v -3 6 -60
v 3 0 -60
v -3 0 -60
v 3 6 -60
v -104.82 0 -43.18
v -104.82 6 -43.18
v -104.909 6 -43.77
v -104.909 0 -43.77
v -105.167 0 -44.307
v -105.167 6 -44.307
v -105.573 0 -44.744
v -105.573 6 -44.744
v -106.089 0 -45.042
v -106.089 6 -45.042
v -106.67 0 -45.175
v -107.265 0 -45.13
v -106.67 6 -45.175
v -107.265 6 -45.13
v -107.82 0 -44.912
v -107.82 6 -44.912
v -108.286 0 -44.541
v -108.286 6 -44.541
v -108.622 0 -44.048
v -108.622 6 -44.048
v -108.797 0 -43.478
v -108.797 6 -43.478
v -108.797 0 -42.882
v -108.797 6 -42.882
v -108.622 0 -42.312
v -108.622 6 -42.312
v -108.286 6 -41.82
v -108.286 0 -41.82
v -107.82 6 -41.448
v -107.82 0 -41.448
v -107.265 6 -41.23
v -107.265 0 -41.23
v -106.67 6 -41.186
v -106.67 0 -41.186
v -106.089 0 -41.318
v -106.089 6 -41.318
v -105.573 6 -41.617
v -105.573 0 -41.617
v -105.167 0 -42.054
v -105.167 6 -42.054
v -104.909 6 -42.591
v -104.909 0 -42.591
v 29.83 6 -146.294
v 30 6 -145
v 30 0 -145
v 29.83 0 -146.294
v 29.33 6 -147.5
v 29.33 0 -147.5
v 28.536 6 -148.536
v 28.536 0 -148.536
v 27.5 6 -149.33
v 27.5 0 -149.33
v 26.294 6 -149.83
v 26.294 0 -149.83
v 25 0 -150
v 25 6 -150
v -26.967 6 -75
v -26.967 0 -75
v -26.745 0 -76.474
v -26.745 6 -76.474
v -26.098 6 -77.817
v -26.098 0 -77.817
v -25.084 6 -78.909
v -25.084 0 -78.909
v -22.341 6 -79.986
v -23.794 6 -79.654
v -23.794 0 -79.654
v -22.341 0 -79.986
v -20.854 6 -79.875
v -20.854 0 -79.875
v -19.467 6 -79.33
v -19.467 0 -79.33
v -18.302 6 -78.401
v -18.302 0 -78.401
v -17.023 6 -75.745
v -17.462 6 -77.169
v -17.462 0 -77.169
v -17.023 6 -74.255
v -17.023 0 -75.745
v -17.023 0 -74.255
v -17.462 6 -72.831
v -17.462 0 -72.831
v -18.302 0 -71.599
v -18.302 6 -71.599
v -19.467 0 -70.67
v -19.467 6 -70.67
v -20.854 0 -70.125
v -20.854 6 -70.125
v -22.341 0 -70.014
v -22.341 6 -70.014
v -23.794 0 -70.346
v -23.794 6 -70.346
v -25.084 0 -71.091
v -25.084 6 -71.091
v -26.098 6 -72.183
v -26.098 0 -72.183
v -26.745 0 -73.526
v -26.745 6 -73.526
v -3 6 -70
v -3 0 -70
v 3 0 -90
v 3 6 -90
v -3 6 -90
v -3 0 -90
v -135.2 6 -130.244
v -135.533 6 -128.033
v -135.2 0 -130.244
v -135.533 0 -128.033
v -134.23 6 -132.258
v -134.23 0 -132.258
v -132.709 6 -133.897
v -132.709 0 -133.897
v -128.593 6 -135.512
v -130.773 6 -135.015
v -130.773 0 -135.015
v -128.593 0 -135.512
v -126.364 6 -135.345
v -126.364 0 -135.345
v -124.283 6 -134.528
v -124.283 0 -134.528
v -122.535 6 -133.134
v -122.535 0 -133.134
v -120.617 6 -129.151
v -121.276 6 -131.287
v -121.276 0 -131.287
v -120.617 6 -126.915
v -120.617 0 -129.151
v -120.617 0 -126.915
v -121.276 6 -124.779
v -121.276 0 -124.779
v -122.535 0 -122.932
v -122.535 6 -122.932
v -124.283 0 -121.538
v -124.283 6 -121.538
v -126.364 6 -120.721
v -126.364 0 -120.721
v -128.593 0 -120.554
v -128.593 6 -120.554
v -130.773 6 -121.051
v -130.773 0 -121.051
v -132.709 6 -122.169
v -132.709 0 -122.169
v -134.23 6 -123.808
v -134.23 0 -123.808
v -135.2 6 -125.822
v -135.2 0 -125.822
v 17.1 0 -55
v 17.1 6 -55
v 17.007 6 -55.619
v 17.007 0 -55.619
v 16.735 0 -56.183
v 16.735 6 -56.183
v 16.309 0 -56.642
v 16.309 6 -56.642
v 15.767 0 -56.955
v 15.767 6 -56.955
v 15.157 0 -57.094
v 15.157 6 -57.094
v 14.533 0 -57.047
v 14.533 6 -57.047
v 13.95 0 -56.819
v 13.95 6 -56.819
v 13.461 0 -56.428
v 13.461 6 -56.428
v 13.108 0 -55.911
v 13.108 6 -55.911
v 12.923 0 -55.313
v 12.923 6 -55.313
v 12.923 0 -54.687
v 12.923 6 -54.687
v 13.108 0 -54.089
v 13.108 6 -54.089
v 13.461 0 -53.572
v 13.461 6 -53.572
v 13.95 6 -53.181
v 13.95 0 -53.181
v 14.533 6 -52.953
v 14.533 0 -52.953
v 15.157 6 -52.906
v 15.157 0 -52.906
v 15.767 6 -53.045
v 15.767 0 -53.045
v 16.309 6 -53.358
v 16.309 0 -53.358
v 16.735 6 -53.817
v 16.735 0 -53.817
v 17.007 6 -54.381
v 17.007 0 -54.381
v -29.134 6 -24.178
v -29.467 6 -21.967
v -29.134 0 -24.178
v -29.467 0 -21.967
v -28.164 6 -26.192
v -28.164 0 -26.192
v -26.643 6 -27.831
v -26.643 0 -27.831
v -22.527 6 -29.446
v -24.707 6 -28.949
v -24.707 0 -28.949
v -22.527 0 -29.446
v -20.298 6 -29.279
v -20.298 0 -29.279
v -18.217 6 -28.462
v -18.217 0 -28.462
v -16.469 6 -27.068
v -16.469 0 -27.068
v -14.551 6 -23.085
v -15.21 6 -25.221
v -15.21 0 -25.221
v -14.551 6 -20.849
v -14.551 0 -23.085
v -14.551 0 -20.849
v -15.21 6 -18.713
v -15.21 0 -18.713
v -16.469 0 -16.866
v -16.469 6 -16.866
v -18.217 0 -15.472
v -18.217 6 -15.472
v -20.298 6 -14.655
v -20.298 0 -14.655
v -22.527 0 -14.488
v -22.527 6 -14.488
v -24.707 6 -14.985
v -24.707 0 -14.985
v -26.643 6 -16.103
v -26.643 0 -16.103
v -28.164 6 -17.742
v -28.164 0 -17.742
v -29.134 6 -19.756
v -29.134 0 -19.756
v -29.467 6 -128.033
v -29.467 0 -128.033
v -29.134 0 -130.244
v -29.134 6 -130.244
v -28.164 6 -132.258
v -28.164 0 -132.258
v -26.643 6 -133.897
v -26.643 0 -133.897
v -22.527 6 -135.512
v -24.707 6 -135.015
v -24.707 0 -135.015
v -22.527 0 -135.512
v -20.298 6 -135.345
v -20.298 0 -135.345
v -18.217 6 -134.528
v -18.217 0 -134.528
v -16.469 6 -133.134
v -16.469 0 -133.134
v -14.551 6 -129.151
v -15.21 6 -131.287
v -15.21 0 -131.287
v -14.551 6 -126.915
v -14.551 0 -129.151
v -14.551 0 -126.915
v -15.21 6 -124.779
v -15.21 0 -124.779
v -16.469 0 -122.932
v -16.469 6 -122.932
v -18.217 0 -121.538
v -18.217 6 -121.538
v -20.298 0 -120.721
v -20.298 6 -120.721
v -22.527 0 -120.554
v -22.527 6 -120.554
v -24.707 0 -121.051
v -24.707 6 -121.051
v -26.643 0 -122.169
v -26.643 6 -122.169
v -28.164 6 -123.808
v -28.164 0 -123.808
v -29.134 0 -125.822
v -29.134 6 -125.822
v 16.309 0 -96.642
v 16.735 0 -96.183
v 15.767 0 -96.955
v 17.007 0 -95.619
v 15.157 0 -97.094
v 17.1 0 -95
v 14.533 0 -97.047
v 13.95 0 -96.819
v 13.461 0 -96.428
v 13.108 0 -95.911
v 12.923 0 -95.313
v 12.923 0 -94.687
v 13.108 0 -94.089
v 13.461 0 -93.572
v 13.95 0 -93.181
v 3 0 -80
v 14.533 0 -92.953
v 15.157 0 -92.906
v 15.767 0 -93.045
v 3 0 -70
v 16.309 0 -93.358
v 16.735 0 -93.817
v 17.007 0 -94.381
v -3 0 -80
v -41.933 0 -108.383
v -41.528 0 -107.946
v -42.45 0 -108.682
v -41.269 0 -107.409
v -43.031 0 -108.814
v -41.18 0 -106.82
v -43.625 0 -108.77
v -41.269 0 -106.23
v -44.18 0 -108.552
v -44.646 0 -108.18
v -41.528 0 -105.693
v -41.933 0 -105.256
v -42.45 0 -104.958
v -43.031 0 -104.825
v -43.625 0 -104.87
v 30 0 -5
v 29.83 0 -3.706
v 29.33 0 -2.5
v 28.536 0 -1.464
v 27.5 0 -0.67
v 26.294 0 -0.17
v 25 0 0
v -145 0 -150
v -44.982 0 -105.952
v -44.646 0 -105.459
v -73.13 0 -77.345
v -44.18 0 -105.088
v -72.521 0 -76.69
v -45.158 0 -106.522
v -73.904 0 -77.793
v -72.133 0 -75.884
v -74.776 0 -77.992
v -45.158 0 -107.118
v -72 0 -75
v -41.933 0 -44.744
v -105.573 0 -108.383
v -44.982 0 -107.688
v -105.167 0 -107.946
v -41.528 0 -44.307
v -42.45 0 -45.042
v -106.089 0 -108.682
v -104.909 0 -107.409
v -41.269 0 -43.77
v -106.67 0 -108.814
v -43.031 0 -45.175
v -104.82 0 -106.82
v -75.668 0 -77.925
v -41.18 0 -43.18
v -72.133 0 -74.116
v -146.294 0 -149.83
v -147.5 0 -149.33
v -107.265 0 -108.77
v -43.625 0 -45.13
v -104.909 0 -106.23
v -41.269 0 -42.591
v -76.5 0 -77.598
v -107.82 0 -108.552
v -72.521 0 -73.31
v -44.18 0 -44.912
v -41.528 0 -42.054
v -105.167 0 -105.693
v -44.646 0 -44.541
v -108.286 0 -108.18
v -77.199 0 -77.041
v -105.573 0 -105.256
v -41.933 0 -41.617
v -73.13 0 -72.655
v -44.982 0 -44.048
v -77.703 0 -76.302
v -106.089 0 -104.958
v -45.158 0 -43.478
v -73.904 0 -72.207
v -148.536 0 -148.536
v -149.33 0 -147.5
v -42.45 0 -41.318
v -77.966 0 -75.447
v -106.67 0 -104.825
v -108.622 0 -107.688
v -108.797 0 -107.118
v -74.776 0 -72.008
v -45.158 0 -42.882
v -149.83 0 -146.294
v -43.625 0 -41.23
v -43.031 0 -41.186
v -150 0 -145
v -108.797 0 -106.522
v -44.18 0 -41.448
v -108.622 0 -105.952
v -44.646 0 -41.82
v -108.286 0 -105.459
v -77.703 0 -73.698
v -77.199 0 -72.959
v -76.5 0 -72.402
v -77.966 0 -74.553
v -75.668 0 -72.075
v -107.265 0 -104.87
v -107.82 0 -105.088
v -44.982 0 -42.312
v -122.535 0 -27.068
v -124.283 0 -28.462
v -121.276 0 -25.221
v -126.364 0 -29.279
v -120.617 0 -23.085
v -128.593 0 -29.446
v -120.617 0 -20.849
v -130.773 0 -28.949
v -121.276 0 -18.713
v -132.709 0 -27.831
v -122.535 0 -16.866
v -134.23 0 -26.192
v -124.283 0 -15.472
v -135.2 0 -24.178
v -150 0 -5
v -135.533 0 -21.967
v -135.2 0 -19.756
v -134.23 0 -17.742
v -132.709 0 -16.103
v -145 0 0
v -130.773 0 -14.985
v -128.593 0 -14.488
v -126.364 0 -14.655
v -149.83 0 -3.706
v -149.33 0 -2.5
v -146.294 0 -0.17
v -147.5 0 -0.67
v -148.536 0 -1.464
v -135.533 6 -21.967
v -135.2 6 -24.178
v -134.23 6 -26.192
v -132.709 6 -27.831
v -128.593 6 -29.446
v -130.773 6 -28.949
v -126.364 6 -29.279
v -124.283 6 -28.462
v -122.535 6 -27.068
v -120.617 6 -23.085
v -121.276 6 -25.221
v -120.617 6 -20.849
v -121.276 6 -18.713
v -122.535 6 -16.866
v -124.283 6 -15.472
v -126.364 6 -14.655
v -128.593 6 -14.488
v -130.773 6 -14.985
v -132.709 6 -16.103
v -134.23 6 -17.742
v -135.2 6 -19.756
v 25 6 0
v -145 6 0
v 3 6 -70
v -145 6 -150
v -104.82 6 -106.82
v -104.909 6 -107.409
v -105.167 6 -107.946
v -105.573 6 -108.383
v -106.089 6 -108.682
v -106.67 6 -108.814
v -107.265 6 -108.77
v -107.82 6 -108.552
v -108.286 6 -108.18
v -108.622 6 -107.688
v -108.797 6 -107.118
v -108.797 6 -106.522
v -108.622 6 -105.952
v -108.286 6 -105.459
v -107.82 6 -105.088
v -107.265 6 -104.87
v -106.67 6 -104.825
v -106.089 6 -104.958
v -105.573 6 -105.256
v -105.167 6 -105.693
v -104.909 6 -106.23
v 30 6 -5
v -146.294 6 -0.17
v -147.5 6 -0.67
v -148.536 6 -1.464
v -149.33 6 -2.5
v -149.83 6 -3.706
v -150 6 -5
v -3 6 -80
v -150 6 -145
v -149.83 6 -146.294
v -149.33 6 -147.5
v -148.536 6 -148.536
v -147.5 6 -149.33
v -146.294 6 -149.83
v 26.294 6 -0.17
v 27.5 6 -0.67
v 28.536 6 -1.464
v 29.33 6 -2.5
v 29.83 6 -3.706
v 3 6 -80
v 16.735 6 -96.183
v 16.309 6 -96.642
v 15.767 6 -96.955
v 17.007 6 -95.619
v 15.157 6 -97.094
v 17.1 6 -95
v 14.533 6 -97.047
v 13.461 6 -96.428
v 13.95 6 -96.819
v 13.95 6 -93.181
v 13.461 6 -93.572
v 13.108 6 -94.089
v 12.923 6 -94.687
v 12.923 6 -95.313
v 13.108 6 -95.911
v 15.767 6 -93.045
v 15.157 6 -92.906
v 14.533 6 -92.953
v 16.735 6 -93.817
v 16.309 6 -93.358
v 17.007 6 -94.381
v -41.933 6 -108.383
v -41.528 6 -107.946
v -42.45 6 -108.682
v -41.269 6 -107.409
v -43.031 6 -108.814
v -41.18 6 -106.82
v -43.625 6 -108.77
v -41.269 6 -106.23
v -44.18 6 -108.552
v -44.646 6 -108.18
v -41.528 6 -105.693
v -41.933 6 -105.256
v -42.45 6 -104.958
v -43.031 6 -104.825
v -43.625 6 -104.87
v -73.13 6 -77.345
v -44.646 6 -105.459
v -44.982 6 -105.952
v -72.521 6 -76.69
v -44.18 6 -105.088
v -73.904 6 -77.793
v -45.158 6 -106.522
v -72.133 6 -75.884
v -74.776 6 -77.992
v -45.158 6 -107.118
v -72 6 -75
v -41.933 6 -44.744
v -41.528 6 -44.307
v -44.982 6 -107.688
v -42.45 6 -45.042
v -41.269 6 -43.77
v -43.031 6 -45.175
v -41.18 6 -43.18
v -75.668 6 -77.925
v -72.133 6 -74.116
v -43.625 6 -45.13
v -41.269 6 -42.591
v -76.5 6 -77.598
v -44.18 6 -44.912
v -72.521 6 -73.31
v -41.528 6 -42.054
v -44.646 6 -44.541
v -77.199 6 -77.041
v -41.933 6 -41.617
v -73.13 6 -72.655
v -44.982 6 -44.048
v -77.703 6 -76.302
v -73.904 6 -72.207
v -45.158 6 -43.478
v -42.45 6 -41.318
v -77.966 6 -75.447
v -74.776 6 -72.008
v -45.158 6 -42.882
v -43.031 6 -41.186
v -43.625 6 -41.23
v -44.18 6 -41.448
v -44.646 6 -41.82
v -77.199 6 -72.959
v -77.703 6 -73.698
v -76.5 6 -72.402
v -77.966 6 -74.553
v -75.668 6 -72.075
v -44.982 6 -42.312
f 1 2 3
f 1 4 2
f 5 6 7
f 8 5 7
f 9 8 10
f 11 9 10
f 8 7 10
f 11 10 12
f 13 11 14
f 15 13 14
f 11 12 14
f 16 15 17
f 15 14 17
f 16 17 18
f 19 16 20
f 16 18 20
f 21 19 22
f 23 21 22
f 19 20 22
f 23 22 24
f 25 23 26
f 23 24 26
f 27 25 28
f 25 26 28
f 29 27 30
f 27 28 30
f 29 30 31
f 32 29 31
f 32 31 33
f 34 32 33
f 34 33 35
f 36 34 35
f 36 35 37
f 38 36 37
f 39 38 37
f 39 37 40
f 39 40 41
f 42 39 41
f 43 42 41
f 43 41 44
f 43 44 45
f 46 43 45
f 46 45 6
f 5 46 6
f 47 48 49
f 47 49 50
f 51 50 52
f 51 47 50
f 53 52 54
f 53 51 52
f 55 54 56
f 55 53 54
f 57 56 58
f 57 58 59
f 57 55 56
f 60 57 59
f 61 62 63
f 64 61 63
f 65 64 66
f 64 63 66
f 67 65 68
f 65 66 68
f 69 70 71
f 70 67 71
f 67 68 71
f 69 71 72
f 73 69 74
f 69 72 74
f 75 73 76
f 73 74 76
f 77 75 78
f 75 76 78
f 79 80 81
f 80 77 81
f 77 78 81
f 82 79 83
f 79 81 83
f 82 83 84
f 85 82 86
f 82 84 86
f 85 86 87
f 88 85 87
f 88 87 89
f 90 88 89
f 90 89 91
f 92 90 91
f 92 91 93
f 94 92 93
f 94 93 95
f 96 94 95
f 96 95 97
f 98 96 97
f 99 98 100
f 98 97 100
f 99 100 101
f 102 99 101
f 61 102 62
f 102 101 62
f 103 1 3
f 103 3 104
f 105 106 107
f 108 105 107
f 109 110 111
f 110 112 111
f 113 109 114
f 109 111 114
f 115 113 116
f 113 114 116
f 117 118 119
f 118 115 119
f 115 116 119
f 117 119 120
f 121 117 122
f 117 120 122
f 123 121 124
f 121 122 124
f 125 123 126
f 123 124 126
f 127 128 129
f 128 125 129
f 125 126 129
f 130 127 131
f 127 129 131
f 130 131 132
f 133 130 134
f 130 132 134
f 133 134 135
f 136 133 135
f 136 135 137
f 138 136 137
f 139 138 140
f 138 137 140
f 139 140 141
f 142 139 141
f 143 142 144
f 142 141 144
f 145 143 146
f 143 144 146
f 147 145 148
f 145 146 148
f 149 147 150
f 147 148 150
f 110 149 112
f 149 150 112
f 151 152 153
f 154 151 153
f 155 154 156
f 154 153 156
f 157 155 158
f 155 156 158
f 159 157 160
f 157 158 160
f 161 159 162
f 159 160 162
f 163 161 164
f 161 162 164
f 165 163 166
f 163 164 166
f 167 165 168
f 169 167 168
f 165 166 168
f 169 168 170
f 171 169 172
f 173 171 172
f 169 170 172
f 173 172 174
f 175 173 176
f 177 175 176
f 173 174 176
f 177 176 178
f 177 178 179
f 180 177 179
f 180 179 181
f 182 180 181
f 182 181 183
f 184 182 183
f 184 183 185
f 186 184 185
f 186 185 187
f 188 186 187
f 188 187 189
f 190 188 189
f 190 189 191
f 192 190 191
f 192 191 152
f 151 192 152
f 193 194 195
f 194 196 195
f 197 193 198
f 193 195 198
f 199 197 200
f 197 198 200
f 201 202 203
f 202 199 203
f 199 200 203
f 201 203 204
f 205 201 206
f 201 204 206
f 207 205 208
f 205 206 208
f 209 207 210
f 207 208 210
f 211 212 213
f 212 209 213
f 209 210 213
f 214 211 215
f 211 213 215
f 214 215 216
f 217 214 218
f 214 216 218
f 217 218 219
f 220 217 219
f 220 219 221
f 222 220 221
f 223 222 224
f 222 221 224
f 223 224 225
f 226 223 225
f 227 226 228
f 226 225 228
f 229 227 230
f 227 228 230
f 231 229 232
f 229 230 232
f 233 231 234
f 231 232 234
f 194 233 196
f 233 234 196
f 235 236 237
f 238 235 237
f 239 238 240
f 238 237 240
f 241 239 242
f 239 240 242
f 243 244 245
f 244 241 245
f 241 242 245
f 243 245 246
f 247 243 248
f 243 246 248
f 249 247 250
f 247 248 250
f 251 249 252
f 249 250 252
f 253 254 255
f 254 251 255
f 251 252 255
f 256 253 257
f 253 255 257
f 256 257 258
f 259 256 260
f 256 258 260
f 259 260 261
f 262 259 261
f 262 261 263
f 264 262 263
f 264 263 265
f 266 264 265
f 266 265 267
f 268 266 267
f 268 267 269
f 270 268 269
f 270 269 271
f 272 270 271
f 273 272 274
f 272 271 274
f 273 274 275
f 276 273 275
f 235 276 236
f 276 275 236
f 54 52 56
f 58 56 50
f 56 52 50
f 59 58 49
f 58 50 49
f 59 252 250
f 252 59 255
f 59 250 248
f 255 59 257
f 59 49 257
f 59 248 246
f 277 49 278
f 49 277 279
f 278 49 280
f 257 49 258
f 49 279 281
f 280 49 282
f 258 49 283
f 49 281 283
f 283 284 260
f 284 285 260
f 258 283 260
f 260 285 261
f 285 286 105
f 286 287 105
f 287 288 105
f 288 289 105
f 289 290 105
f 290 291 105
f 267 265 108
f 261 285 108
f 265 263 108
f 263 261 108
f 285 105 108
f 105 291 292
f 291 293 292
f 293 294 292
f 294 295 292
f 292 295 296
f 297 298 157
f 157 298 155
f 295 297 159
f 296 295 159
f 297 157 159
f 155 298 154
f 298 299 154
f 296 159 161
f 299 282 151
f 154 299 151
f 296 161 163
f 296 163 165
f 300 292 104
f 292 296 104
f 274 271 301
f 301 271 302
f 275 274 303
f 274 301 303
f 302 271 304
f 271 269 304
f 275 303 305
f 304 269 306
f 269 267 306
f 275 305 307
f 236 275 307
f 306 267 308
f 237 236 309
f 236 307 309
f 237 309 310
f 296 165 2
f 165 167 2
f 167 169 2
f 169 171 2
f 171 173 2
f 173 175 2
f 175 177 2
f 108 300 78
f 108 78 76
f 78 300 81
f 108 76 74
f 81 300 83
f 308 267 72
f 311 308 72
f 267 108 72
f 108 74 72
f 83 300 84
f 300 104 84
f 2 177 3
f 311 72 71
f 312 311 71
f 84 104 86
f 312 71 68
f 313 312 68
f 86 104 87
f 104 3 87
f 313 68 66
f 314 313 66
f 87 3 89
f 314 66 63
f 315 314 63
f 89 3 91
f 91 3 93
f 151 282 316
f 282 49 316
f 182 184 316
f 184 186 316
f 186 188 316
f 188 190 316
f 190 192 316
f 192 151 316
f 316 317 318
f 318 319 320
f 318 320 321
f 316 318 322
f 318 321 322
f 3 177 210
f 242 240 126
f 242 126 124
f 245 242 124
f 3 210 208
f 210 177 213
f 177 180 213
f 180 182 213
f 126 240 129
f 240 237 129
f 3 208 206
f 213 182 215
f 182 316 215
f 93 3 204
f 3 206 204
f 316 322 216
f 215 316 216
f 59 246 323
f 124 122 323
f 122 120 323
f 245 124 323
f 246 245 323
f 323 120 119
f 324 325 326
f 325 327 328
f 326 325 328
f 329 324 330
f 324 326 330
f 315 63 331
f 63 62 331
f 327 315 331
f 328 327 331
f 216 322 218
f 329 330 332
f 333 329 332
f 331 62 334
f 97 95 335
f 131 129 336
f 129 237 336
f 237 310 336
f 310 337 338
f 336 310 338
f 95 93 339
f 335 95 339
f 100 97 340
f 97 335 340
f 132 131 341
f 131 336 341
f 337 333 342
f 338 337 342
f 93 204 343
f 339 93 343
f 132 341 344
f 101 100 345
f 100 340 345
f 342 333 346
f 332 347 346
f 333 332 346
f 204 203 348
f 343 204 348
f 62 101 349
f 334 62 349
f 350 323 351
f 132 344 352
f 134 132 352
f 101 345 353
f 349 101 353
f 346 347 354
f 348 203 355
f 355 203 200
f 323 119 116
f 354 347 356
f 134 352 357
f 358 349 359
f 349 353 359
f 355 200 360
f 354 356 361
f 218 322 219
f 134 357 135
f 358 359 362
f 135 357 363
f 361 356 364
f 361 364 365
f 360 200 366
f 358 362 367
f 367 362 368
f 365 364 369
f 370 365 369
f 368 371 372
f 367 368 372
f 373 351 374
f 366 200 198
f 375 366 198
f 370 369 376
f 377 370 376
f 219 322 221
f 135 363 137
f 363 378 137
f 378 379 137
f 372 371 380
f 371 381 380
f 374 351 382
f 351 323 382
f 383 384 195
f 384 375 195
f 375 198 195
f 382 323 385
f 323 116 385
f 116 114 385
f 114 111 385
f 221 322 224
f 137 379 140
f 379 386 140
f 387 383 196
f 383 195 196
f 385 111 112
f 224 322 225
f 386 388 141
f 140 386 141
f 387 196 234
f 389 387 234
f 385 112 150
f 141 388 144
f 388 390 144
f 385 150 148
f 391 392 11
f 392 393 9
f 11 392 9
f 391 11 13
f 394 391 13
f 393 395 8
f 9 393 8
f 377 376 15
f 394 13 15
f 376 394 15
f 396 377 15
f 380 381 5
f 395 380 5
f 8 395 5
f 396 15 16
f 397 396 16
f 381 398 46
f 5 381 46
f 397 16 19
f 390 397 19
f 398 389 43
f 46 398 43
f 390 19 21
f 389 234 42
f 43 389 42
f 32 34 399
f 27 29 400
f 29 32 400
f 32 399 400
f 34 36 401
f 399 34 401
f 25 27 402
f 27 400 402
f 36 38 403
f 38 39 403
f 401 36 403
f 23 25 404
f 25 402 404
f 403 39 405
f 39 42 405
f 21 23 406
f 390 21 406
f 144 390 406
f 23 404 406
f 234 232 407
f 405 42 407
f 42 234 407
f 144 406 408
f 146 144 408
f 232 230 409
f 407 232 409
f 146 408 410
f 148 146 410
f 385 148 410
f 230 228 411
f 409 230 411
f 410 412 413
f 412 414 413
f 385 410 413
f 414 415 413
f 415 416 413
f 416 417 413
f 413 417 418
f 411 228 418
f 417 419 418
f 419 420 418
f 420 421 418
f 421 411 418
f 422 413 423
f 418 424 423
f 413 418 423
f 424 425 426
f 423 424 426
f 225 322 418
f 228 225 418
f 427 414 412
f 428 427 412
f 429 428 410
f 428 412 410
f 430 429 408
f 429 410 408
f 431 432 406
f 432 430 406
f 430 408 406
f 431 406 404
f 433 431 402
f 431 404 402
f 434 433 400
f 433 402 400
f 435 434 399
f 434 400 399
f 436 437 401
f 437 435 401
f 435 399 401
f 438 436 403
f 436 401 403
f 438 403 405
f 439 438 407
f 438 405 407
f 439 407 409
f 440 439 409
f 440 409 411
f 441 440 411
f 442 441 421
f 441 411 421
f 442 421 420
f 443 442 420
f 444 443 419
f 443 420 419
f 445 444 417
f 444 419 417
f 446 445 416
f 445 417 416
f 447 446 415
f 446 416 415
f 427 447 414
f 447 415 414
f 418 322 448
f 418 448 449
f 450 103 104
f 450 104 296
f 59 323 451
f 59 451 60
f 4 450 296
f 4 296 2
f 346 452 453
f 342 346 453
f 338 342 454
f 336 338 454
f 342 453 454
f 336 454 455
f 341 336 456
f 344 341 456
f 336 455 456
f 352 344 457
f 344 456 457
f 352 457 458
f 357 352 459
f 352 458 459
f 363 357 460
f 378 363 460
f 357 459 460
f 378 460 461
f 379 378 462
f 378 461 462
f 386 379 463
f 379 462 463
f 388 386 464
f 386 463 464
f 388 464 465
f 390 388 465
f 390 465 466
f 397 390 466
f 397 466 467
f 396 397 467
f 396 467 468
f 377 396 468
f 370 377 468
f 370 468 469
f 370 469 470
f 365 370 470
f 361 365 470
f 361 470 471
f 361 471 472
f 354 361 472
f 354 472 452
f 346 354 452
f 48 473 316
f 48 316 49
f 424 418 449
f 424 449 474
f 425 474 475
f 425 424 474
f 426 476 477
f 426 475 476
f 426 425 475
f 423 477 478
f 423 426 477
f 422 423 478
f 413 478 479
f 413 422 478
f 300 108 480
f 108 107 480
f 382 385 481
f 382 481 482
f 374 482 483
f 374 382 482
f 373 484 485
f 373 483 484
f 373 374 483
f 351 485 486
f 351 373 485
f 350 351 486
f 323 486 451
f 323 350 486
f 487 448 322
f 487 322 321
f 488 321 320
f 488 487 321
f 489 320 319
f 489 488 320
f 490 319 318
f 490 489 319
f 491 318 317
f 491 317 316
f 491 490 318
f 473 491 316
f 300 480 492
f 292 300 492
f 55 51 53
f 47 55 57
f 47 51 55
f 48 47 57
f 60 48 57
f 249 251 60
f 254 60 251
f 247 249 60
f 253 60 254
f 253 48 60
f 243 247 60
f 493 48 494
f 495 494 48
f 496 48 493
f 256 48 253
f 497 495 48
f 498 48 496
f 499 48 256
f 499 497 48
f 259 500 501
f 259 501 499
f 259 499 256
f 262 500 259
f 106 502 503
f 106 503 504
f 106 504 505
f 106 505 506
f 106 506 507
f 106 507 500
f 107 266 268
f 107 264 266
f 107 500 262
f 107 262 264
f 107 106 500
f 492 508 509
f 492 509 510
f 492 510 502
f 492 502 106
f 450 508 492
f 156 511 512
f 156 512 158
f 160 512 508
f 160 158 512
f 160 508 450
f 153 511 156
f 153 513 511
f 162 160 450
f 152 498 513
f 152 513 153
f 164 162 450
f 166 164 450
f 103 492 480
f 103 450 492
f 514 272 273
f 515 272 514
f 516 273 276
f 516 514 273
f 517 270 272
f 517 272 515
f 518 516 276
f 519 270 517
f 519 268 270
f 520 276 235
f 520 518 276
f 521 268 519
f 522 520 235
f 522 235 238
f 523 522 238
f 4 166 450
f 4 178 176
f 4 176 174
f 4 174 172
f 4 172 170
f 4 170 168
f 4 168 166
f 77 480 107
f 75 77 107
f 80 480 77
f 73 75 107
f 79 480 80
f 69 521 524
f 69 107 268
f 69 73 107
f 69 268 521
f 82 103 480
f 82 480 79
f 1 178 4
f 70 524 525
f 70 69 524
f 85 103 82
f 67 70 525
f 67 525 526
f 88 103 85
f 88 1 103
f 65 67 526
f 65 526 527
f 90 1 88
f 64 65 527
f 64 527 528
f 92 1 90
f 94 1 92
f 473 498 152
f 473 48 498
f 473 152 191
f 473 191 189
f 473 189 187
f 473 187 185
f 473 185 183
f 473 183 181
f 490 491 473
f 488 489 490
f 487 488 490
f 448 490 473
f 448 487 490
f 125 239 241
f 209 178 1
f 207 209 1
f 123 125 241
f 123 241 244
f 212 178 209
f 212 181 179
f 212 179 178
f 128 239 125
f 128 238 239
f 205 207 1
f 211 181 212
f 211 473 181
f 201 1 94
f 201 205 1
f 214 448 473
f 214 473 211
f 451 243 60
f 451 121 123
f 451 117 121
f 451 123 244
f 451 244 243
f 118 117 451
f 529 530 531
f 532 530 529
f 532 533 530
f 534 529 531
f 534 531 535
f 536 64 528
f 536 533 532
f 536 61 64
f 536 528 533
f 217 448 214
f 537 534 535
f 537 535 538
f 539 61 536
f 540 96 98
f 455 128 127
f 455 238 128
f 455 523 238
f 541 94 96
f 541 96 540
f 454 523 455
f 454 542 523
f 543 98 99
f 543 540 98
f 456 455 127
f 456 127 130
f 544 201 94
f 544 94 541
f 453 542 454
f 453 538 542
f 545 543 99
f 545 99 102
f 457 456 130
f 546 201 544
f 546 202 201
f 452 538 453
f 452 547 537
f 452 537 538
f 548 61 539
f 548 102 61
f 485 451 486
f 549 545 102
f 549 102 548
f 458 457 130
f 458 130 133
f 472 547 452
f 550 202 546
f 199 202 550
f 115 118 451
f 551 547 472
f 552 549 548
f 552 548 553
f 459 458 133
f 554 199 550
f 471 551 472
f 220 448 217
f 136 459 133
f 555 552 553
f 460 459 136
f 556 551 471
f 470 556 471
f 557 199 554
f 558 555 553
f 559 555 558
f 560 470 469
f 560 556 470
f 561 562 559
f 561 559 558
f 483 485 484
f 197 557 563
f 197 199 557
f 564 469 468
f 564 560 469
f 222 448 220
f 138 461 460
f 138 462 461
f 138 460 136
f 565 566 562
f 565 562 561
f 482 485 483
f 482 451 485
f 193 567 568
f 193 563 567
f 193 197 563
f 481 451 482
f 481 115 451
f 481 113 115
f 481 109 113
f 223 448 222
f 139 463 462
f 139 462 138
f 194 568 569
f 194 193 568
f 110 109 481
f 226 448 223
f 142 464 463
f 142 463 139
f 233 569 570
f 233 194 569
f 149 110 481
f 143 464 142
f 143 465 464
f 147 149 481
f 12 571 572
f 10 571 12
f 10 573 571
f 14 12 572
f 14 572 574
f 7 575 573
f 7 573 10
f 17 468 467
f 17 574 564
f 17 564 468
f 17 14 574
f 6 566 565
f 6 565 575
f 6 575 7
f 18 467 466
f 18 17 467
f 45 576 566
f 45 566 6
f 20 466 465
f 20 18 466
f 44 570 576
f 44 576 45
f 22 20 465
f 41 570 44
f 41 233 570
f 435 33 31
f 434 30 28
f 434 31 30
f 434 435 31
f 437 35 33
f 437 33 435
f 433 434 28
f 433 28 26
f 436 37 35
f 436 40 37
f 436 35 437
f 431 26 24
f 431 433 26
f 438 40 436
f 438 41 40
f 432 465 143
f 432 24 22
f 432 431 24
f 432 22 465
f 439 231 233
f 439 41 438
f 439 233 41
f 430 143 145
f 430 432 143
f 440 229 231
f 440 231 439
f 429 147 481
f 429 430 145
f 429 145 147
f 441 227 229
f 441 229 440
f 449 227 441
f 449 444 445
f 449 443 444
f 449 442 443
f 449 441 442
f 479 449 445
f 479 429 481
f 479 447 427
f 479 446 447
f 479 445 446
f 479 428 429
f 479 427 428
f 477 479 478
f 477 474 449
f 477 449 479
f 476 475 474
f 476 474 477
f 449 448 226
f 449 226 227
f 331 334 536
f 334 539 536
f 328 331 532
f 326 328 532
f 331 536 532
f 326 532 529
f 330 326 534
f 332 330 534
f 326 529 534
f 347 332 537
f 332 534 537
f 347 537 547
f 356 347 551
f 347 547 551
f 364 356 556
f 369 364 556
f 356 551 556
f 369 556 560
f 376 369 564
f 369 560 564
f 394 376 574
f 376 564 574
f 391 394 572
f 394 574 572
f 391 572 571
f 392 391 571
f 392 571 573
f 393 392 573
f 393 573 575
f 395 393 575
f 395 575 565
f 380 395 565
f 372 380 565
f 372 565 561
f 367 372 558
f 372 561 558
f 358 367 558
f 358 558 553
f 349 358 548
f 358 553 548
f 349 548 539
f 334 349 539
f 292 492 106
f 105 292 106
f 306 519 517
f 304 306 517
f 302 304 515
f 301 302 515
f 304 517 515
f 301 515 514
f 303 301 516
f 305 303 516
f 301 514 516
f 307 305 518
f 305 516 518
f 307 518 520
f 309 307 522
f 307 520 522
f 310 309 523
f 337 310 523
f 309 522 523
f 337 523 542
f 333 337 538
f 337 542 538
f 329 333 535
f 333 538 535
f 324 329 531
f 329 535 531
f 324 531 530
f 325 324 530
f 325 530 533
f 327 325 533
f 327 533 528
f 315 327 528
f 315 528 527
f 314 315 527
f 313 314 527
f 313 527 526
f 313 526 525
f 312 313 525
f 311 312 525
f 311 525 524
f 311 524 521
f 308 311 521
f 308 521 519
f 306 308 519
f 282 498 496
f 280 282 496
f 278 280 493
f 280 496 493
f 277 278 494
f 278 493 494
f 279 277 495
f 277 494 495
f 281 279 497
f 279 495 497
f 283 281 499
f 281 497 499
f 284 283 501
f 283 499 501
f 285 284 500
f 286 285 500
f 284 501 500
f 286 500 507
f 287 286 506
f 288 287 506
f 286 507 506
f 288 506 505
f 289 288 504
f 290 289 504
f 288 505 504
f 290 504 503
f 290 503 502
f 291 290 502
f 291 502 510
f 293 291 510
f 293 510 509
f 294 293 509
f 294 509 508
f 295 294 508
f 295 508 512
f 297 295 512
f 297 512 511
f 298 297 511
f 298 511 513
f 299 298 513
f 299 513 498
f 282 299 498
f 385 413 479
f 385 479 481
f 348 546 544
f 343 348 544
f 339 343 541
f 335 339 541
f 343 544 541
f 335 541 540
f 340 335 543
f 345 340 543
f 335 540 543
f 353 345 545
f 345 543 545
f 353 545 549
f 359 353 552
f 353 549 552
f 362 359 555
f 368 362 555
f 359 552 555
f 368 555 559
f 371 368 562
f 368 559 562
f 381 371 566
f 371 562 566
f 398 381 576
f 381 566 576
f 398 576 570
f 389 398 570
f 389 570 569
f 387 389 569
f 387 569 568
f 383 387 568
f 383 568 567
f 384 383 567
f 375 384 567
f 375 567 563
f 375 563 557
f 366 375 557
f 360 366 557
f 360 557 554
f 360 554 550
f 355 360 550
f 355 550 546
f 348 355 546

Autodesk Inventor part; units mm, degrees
ref_plane "YZ Plane" through (0, 0, 0) normal (1, 0, 0) x (0, 1, 0)
ref_plane "XZ Plane" through (0, 0, 0) normal (0, 1, 0) x (-1, 0, 0)
ref_plane "XY Plane" through (0, 0, 0) normal (0, 0, 1) x (1, 0, 0)
sketch "Sketch1" plane through (0, 0, 0) normal (0, 1, 0) x (-1, 0, 0)
  line L0 (5, 0) -> (145, 0)
  line L1 (150, -5) -> (150, -145)
  line L2 (145, -150) -> (5, -150)
  line L3 (0, -145) -> (0, -5)
  arc A0 (150, -5) -> (145, 0) centre (145, -5) ccw
  arc A1 (150, -5) -> (145, 0) centre (145, -5) ccw
  arc A2 (145, -150) -> (150, -145) centre (145, -145) ccw
  arc A3 (5, 0) -> (0, -5) centre (5, -5) ccw
  arc A4 (0, -145) -> (5, -150) centre (5, -145) ccw
  circle A5 centre (128.033, -21.967) radius 7.5
  circle A6 centre (128.033, -128.033) radius 7.5
  circle A7 centre (21.967, -128.033) radius 7.5
  circle A8 centre (21.967, -21.967) radius 7.5
  circle A9 centre (21.967, -75) radius 5
  point P0 (150, -150)
  point P1 (150, 0)
  point P2 (0, -150)
  dimension "d12" = 150
  dimension "d13" = 150
  dimension "d22" = 5
  dimension "d23" = 5
  dimension "d28" = 15
  dimension "d29" = 15
  dimension "d30" = 15
  dimension "d31" = 15
  dimension "d32" = 10
extrude "Extrusion1" add sketch "Sketch1" along normal blind 6
sketch "Sketch2" plane through (0, 6, 0) normal (0, 1, 0) x (1, 0, 0)
  arc A0 (-5, 0) -> (0, 5) centre (-5, 5) ccw projected
  arc A1 (-145, 150) -> (-150, 145) centre (-145, 145) ccw projected
  arc A2 (-150, 5) -> (-145, 0) centre (-145, 5) ccw projected
  circle A3 centre (-21.967, 128.033) radius 7.5 projected
  circle A4 centre (-128.033, 21.967) radius 7.5 projected
  circle A5 centre (-128.033, 128.033) radius 7.5 projected
  circle A6 centre (-106.8198, 43.1802) radius 2
  circle A7 centre (-106.8198, 106.8198) radius 2
  circle A8 centre (-43.1802, 43.1802) radius 2
  circle A9 centre (-43.1802, 106.8198) radius 2
  circle A10 centre (-75, 75) radius 3
  point P0 (0, 0)
  dimension "d39" = 4
  dimension "d40" = 4
  dimension "d41" = 4
  dimension "d42" = 4
  dimension "d43" = 6
  dimension "d47" = 30
extrude "Extrusion2" cut sketch "Sketch2" against normal blind 6 contours A6 | A7 | A8 | A9 | A10
sketch "Sketch3" plane through (0, 6, 0) normal (0, 1, 0) x (1, 0, 0)
  arc A0 (-5, 0) -> (0, 5) centre (-5, 5) ccw projected
  line L0 (-5, 0) -> (25, 0)
  line L1 (30, 5) -> (30, 145)
  line L2 (25, 150) -> (-5, 150)
  line L3 (-5, 150) -> (-5, 0)
  arc A1 (25, 0) -> (30, 5) centre (25, 5) ccw
  arc A2 (30, 145) -> (25, 150) centre (25, 145) ccw
  point P0 (0, 0)
  point P1 (30, 150)
  point P2 (30, 0)
  dimension "d48" = 35
  dimension "d49" = 150
  dimension "d50" = 5
extrude "Extrusion3" add sketch "Sketch3" against normal blind 6
sketch "Sketch4" plane through (0, 6, 0) normal (0, 1, 0) x (1, 0, 0)
  line L0 (30, 145) -> (30, 5) projected
  line L1 (-3, 80) -> (3, 80)
  line L2 (3, 80) -> (3, 90)
  line L3 (3, 90) -> (-3, 90)
  line L4 (-3, 90) -> (-3, 80)
  line L5 (-3, 70) -> (3, 70)
  line L6 (3, 70) -> (3, 60)
  line L7 (3, 60) -> (-3, 60)
  line L8 (-3, 60) -> (-3, 70)
  circle A0 centre (15, 55) radius 2.1
  circle A1 centre (15, 95) radius 2.1
  line L9 (15, 55) -> (15, 75)
  line L10 (15, 75) -> (15, 95)
  point P0 (0, 0)
  dimension "d55" = 10
  dimension "d56" = 6
  dimension "d57" = 10
  dimension "d58" = 6
  dimension "d59" = 10
  dimension "d63" = 4.2
  dimension "d64" = 4.2
  dimension "d69" = 20
  dimension "d70" = 20
extrude "Extrusion4" cut sketch "Sketch4" against normal blind 6
properties part number "E_base2"
